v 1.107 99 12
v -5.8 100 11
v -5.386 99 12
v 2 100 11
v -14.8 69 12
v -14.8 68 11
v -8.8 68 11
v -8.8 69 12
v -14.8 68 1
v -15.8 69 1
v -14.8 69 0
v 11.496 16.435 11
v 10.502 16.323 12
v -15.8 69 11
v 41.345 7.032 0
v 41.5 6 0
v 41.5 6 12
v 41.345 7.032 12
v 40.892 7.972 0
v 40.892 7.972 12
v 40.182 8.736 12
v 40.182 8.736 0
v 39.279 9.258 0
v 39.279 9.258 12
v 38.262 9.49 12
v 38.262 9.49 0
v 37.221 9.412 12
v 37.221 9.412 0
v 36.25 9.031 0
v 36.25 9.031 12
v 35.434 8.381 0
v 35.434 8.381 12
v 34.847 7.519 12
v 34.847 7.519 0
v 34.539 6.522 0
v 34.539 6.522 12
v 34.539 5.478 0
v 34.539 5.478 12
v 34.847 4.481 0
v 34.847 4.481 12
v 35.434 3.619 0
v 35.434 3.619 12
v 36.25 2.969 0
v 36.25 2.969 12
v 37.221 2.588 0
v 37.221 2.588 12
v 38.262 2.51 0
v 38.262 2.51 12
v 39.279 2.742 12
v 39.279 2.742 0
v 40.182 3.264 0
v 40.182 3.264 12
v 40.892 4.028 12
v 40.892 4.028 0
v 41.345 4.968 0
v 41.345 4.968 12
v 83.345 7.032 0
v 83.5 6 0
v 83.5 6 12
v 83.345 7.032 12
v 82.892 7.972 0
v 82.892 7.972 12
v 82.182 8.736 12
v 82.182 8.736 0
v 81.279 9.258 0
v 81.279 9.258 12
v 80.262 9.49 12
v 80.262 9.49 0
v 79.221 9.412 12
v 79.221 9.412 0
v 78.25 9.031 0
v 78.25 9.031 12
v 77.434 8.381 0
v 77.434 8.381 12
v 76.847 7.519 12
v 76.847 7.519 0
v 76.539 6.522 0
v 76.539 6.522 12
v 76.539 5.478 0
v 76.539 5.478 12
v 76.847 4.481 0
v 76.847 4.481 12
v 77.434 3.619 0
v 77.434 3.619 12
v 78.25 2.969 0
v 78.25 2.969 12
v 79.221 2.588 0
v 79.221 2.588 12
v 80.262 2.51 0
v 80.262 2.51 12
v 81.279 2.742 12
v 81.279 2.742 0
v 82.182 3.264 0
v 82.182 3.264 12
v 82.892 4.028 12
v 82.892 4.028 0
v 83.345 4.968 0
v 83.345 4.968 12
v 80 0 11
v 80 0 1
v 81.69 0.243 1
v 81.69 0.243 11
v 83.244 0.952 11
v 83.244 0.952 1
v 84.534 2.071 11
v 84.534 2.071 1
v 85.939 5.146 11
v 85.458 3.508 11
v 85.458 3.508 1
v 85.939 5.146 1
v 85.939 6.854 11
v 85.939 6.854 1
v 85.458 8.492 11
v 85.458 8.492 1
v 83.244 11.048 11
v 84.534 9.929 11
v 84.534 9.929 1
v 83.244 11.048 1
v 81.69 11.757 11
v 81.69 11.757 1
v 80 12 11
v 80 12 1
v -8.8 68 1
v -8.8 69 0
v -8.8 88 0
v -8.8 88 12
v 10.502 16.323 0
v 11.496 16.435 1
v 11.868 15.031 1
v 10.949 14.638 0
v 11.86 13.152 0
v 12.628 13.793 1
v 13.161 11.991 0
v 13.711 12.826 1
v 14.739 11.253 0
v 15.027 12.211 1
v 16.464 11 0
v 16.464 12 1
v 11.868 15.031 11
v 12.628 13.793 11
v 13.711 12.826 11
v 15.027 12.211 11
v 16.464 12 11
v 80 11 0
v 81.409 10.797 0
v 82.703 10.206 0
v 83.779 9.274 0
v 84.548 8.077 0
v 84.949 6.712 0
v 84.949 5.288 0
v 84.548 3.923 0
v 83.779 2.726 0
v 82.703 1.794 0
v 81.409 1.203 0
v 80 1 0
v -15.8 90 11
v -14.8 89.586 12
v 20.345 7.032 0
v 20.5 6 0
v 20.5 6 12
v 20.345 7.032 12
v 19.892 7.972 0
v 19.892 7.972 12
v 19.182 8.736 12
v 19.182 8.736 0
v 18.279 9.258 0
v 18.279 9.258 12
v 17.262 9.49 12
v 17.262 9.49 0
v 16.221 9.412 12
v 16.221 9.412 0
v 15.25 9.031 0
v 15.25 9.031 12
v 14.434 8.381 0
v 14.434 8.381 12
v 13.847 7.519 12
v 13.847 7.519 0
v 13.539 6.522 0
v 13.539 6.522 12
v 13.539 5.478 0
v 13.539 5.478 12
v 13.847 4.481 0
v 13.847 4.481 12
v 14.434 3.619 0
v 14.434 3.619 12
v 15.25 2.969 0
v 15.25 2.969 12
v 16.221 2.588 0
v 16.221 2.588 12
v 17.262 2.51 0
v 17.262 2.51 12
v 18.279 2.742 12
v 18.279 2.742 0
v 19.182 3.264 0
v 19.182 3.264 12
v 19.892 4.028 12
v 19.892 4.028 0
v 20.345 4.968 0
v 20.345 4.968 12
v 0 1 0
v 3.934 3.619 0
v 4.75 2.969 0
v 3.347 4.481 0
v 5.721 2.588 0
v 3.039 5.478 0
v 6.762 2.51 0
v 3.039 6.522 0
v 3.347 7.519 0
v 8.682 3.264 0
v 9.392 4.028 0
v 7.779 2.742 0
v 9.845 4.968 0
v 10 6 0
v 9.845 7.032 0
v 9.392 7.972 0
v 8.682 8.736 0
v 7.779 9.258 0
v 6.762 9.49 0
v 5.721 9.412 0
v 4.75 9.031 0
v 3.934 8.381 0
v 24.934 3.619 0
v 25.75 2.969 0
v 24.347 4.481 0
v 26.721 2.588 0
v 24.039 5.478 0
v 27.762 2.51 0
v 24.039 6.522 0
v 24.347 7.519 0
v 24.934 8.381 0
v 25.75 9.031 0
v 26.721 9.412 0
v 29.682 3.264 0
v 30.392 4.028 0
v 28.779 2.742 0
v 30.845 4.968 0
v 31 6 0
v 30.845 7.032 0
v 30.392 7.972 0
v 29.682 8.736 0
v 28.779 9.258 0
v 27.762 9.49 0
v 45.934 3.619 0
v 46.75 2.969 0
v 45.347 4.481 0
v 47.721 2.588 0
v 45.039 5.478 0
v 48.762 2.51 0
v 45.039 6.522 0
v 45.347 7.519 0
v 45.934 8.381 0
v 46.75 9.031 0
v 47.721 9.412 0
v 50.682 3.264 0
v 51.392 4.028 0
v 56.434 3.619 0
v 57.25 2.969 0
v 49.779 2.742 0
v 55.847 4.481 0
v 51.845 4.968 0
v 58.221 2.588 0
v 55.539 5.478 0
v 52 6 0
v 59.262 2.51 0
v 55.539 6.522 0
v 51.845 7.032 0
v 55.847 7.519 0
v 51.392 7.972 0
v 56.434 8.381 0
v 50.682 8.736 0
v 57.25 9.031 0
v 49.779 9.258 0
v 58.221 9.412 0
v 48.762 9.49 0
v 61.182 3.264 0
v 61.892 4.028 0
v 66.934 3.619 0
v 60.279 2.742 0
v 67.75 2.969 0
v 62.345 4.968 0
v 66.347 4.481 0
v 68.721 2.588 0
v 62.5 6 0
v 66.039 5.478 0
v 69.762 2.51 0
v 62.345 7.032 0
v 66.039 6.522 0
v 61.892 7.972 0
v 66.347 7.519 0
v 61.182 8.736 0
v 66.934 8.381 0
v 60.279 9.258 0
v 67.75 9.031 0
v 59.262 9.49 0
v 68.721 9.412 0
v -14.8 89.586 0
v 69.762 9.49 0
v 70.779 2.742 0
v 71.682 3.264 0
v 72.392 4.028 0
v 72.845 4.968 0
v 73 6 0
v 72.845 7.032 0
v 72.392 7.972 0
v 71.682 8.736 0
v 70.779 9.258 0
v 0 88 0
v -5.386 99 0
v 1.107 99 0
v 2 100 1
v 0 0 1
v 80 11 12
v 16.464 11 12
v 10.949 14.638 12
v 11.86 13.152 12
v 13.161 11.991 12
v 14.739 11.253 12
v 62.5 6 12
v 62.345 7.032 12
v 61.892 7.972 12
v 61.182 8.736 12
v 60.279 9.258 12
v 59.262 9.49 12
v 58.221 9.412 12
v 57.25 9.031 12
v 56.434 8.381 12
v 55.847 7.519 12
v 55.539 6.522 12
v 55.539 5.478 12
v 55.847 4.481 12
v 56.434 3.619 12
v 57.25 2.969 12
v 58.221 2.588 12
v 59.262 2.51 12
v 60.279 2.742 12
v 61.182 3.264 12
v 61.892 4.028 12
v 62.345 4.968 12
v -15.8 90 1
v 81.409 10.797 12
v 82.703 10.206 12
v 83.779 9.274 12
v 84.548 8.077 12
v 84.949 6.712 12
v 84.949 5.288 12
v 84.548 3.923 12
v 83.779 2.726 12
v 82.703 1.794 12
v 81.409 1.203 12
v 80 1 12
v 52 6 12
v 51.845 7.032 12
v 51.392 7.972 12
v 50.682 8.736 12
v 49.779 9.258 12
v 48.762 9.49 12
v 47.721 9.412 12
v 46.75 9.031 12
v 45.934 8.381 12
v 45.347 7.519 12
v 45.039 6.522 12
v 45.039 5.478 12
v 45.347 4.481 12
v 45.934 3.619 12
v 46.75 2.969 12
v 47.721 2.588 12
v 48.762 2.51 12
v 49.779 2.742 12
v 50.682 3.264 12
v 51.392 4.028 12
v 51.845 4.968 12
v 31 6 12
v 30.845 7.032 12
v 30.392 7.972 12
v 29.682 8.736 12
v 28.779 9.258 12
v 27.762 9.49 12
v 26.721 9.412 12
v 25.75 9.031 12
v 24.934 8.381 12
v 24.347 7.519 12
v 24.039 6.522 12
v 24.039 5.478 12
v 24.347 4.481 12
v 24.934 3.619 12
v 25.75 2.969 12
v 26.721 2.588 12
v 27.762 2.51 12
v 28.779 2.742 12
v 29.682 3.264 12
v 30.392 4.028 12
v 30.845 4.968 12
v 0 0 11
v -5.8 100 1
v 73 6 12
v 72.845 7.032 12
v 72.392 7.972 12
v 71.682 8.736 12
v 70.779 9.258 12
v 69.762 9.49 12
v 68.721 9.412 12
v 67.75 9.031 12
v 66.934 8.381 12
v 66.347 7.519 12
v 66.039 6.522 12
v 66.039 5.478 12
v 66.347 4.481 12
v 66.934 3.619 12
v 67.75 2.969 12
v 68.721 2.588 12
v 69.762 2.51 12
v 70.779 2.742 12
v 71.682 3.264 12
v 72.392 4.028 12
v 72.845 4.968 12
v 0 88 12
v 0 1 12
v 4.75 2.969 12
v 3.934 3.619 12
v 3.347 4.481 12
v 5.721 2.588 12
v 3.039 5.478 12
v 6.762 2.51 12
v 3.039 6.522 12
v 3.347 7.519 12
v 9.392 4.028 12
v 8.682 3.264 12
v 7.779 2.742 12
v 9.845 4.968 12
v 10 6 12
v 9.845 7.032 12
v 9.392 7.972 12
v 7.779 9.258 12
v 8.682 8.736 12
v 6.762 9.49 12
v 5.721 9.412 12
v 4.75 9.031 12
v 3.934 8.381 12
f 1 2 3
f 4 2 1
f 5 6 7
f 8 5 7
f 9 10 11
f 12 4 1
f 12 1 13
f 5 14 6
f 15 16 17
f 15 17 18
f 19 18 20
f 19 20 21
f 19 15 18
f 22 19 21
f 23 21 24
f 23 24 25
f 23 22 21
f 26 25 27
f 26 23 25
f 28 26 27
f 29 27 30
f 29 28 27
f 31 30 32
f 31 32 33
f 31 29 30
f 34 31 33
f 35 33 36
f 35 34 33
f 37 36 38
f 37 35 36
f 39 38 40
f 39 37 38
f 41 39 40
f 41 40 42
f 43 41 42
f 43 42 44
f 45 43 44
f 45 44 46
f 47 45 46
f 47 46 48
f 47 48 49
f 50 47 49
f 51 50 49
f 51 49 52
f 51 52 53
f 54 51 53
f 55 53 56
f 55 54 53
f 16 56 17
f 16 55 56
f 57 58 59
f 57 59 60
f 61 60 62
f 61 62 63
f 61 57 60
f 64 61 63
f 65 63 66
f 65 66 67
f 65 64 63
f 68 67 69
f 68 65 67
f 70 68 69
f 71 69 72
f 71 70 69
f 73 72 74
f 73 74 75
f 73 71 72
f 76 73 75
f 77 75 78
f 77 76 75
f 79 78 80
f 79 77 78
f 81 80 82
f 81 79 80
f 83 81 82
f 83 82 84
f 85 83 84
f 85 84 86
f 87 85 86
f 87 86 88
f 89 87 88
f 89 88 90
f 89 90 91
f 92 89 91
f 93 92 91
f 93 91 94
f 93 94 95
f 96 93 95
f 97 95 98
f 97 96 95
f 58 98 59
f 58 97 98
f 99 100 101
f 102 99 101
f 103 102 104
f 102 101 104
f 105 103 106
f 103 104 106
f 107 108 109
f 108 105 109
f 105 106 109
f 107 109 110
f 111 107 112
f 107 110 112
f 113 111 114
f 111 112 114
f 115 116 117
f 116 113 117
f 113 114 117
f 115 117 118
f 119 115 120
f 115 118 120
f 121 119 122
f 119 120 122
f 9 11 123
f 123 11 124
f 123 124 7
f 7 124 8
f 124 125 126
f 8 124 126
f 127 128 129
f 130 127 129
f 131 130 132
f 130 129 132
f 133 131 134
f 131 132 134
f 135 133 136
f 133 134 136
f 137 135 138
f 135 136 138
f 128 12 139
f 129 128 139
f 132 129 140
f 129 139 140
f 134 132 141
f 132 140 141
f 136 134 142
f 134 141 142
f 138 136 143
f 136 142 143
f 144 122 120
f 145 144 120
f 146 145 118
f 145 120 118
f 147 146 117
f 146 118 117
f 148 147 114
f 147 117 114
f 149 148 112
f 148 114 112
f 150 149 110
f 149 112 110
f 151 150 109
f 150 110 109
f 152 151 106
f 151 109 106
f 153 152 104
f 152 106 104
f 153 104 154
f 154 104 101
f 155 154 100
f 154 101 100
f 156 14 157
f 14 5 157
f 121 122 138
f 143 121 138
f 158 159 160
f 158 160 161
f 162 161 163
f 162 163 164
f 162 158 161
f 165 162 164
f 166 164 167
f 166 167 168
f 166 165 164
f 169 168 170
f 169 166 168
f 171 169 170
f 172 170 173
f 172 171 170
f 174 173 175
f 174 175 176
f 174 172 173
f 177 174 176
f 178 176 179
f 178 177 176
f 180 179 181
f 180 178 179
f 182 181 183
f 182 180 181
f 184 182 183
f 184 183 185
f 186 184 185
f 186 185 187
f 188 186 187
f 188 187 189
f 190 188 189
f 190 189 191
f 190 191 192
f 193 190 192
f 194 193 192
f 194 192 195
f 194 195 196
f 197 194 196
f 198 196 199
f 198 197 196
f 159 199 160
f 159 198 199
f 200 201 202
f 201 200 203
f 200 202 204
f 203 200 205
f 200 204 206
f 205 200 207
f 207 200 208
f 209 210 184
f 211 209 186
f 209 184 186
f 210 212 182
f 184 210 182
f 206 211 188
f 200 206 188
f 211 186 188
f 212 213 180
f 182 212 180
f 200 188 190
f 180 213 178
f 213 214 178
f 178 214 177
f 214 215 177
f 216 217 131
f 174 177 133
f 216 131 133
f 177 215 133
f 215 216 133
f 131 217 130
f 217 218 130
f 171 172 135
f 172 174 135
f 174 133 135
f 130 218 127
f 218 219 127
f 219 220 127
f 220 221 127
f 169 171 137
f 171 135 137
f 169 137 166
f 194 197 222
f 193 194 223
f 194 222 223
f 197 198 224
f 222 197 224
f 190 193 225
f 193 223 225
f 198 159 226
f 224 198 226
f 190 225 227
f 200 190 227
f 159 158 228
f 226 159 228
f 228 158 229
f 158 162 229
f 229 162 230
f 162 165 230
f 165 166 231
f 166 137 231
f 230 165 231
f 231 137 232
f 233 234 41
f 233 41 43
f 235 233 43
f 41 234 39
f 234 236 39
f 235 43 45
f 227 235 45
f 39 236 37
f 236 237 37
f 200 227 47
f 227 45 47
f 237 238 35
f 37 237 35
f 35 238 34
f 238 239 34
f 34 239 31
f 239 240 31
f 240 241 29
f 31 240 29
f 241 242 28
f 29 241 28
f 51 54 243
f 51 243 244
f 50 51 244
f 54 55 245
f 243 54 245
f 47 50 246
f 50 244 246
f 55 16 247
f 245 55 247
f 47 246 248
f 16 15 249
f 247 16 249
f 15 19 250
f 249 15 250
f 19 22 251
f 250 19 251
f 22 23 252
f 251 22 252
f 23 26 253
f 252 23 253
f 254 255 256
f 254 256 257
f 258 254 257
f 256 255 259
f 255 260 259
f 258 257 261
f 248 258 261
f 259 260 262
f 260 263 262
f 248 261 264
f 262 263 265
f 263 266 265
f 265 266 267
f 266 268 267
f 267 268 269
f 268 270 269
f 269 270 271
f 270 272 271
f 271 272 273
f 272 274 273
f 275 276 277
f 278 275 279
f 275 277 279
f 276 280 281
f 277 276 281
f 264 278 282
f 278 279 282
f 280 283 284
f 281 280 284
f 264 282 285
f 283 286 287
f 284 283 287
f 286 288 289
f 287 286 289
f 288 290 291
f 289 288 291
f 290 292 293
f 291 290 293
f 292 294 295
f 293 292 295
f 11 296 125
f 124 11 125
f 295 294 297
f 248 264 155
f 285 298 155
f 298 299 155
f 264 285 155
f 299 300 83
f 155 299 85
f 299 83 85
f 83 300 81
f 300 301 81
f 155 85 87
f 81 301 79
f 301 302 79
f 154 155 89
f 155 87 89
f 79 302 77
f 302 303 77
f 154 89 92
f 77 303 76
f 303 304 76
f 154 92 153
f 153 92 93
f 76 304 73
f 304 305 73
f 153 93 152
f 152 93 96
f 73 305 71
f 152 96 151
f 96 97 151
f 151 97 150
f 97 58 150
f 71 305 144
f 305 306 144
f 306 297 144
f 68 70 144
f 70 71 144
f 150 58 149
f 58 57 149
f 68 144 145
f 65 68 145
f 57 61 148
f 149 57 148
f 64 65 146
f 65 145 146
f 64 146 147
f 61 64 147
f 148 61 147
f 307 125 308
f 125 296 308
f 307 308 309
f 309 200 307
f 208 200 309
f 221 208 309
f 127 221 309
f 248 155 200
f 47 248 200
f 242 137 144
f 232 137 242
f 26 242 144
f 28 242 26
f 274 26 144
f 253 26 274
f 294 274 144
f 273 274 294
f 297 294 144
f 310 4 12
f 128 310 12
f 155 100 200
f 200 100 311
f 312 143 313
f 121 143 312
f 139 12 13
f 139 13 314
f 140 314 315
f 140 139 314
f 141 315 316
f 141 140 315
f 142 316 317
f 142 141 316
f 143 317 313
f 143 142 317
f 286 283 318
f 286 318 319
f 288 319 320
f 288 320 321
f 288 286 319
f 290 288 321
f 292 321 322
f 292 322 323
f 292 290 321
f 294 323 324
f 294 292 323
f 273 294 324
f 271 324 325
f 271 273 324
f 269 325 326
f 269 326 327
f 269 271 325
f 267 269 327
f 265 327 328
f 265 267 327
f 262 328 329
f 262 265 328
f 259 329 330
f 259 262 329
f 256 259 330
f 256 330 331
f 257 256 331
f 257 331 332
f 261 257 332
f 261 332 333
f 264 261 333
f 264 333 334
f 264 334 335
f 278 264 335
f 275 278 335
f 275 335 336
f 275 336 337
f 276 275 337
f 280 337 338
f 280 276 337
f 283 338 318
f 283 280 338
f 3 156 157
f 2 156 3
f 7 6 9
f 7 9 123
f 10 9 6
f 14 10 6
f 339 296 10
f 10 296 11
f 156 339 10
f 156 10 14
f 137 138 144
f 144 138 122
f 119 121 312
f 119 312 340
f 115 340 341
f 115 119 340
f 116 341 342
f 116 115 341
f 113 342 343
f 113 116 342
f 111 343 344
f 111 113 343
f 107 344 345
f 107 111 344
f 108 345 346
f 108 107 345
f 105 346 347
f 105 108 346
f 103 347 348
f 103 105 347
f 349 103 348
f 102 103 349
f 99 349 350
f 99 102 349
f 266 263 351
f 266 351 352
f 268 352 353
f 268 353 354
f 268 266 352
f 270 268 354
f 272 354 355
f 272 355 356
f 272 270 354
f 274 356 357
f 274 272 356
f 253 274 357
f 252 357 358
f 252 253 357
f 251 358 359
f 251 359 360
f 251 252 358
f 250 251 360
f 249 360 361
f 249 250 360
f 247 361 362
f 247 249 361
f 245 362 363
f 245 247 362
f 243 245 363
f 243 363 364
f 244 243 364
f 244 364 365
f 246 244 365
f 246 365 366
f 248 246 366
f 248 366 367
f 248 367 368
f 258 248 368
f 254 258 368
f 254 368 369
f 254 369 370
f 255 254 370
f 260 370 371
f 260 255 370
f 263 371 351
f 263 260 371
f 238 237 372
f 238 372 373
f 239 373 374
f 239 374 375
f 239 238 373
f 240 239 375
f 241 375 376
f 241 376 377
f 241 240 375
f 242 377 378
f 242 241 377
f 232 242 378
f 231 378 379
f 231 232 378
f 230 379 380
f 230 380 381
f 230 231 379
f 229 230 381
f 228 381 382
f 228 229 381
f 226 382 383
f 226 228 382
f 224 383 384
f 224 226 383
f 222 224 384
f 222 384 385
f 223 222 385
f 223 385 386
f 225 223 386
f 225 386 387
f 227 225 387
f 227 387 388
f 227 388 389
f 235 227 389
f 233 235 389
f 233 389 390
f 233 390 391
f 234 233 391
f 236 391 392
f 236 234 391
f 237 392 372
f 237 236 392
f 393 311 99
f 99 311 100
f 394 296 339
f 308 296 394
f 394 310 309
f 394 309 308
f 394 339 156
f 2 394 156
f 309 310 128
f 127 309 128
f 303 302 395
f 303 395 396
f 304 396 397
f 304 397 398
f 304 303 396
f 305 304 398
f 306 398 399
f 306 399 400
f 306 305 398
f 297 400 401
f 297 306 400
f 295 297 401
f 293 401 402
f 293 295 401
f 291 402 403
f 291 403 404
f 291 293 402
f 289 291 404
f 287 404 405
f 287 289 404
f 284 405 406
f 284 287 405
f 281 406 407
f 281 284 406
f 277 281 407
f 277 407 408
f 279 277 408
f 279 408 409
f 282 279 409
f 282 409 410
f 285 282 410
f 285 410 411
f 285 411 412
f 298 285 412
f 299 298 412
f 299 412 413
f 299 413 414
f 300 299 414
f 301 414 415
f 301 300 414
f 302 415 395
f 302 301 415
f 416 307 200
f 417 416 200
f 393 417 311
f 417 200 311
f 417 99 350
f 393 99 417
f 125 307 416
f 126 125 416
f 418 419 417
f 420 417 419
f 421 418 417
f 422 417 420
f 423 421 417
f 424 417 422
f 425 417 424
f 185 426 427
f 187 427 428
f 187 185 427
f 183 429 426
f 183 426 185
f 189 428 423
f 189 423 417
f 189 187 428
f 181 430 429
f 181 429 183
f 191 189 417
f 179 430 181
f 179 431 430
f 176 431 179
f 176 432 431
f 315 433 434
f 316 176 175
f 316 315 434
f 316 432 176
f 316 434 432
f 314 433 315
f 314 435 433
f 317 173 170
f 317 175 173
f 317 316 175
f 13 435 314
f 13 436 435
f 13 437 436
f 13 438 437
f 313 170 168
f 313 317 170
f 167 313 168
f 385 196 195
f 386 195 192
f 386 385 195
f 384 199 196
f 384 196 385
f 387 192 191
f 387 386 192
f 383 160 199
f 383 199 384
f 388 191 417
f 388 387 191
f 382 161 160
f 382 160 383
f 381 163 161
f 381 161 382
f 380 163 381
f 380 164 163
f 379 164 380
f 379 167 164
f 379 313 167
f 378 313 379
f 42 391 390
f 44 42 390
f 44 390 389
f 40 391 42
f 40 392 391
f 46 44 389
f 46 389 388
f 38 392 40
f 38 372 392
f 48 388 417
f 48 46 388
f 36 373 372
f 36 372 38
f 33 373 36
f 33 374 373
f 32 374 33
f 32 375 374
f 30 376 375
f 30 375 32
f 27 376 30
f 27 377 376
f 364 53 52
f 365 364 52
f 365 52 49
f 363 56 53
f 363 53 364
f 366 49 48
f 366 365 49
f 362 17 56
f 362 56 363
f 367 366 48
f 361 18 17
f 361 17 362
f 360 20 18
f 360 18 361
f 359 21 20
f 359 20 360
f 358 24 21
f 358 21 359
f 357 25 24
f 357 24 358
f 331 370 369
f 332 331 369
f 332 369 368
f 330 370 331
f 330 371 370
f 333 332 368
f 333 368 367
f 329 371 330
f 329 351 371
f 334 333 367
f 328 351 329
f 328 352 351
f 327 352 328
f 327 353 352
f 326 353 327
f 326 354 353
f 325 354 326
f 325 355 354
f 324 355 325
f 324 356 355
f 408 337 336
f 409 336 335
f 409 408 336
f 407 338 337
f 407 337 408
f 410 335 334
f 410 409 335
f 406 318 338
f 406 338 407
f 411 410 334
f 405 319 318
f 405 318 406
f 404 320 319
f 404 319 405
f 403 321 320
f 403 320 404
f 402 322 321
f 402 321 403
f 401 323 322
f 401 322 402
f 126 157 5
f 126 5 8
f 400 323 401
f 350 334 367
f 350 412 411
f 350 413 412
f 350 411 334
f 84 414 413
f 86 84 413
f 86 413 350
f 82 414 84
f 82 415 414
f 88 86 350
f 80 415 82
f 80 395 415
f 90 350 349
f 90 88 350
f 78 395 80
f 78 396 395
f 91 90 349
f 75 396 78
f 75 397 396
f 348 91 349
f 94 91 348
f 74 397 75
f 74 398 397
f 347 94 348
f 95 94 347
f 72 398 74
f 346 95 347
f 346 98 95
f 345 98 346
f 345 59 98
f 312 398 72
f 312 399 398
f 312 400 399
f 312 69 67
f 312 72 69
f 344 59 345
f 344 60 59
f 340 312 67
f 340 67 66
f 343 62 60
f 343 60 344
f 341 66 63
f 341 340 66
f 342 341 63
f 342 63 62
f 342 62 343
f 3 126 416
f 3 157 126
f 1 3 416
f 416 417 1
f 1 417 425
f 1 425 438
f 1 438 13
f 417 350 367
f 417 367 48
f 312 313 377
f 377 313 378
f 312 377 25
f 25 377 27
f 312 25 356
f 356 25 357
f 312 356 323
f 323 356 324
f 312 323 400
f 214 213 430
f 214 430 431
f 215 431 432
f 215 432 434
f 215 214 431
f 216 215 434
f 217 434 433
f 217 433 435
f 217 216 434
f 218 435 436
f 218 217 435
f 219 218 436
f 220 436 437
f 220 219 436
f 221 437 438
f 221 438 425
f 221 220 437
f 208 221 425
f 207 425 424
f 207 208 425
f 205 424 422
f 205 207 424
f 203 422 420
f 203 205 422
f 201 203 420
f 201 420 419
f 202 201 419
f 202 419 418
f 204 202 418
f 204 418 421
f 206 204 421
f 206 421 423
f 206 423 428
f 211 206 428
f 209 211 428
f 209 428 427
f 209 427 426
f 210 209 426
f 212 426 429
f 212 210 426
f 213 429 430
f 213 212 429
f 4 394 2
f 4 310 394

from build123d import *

# Parameters (mm, degrees)
F0_R     = 3.5
F1_DEPTH = 12
F3_DEPTH = 25
F4_R     = 5
F5_W     = 12
F5_H     = 12
F6_DEPTH = 15.8
F7_W     = 7
F7_H     = 12
F8_DEPTH = 20
F9_SIZE  = 10
F10_SIZE = 1


with BuildPart() as f1:
    # F0 (on Top) → F1 (new body)
    with BuildSketch(Plane.XY):
        with BuildLine():
            Line((12, 100), (0, 100))
            Line((0, 100), (0, 0))
            Line((0, 0), (80, 0))
            ThreePointArc((80, 0), (86, 6), (80, 12))
            Line((80, 12), (12, 12))
            Line((12, 12), (12, 100))
        make_face()
        with Locations((6.5, 6)):
            Circle(F0_R, mode=Mode.SUBTRACT)
        with Locations((17, 6)):
            Circle(F0_R, mode=Mode.SUBTRACT)
        with Locations((27.5, 6)):
            Circle(F0_R, mode=Mode.SUBTRACT)
        with Locations((38, 6)):
            Circle(F0_R, mode=Mode.SUBTRACT)
        with Locations((48.5, 6)):
            Circle(F0_R, mode=Mode.SUBTRACT)
        with Locations((59, 6)):
            Circle(F0_R, mode=Mode.SUBTRACT)
        with Locations((69.5, 6)):
            Circle(F0_R, mode=Mode.SUBTRACT)
        with Locations((80, 6)):
            Circle(F0_R, mode=Mode.SUBTRACT)
    extrude(amount=F1_DEPTH)

    # F2 (on face) → F3 (cut)
    with BuildSketch(Plane.XY.offset(12)):
        Polygon((2, 100), (12, 12), (12, 100), align=None)
    extrude(amount=-F3_DEPTH, mode=Mode.SUBTRACT)

    # F4
    f4_edges = [f1.edges().sort_by_distance(p)[0] for p in [
        (12, 12, 6),
    ]]
    fillet(f4_edges, radius=F4_R)

    # F5 (on face) → F6 (join)
    with BuildSketch(Plane(origin=(0, 0, 0), x_dir=(0, -1, 0), z_dir=(-1, 0, 0))):
        with Locations((-94, 6)):
            Rectangle(F5_W, F5_H)
    extrude(amount=F6_DEPTH)

    # F7 (on face) → F8 (join)
    with BuildSketch(Plane.XZ.offset(-88)):
        with Locations((-12.3, 6)):
            Rectangle(F7_W, F7_H)
    extrude(amount=F8_DEPTH)

    # F9
    f9_edges = [f1.edges().sort_by_distance(p)[0] for p in [
        (-15.8, 100, 6),
    ]]
    chamfer(f9_edges, length=F9_SIZE)

    # F10
    f10_edges = [f1.edges().sort_by_distance(p)[0] for p in [
        (6.747986, 58.217726, 12),
        (6.747986, 58.217726, 0),
        (-1.9, 100, 12),
        (-10.8, 95, 12),
        (-15.8, 79, 12),
        (-1.9, 100, 0),
        (-10.8, 95, 0),
        (-15.8, 79, 0),
        (-15.8, 68, 6),
        (-12.3, 68, 12),
        (-12.3, 68, 0),
    ]]
    chamfer(f10_edges, length=F10_SIZE)


solid = f1.part
